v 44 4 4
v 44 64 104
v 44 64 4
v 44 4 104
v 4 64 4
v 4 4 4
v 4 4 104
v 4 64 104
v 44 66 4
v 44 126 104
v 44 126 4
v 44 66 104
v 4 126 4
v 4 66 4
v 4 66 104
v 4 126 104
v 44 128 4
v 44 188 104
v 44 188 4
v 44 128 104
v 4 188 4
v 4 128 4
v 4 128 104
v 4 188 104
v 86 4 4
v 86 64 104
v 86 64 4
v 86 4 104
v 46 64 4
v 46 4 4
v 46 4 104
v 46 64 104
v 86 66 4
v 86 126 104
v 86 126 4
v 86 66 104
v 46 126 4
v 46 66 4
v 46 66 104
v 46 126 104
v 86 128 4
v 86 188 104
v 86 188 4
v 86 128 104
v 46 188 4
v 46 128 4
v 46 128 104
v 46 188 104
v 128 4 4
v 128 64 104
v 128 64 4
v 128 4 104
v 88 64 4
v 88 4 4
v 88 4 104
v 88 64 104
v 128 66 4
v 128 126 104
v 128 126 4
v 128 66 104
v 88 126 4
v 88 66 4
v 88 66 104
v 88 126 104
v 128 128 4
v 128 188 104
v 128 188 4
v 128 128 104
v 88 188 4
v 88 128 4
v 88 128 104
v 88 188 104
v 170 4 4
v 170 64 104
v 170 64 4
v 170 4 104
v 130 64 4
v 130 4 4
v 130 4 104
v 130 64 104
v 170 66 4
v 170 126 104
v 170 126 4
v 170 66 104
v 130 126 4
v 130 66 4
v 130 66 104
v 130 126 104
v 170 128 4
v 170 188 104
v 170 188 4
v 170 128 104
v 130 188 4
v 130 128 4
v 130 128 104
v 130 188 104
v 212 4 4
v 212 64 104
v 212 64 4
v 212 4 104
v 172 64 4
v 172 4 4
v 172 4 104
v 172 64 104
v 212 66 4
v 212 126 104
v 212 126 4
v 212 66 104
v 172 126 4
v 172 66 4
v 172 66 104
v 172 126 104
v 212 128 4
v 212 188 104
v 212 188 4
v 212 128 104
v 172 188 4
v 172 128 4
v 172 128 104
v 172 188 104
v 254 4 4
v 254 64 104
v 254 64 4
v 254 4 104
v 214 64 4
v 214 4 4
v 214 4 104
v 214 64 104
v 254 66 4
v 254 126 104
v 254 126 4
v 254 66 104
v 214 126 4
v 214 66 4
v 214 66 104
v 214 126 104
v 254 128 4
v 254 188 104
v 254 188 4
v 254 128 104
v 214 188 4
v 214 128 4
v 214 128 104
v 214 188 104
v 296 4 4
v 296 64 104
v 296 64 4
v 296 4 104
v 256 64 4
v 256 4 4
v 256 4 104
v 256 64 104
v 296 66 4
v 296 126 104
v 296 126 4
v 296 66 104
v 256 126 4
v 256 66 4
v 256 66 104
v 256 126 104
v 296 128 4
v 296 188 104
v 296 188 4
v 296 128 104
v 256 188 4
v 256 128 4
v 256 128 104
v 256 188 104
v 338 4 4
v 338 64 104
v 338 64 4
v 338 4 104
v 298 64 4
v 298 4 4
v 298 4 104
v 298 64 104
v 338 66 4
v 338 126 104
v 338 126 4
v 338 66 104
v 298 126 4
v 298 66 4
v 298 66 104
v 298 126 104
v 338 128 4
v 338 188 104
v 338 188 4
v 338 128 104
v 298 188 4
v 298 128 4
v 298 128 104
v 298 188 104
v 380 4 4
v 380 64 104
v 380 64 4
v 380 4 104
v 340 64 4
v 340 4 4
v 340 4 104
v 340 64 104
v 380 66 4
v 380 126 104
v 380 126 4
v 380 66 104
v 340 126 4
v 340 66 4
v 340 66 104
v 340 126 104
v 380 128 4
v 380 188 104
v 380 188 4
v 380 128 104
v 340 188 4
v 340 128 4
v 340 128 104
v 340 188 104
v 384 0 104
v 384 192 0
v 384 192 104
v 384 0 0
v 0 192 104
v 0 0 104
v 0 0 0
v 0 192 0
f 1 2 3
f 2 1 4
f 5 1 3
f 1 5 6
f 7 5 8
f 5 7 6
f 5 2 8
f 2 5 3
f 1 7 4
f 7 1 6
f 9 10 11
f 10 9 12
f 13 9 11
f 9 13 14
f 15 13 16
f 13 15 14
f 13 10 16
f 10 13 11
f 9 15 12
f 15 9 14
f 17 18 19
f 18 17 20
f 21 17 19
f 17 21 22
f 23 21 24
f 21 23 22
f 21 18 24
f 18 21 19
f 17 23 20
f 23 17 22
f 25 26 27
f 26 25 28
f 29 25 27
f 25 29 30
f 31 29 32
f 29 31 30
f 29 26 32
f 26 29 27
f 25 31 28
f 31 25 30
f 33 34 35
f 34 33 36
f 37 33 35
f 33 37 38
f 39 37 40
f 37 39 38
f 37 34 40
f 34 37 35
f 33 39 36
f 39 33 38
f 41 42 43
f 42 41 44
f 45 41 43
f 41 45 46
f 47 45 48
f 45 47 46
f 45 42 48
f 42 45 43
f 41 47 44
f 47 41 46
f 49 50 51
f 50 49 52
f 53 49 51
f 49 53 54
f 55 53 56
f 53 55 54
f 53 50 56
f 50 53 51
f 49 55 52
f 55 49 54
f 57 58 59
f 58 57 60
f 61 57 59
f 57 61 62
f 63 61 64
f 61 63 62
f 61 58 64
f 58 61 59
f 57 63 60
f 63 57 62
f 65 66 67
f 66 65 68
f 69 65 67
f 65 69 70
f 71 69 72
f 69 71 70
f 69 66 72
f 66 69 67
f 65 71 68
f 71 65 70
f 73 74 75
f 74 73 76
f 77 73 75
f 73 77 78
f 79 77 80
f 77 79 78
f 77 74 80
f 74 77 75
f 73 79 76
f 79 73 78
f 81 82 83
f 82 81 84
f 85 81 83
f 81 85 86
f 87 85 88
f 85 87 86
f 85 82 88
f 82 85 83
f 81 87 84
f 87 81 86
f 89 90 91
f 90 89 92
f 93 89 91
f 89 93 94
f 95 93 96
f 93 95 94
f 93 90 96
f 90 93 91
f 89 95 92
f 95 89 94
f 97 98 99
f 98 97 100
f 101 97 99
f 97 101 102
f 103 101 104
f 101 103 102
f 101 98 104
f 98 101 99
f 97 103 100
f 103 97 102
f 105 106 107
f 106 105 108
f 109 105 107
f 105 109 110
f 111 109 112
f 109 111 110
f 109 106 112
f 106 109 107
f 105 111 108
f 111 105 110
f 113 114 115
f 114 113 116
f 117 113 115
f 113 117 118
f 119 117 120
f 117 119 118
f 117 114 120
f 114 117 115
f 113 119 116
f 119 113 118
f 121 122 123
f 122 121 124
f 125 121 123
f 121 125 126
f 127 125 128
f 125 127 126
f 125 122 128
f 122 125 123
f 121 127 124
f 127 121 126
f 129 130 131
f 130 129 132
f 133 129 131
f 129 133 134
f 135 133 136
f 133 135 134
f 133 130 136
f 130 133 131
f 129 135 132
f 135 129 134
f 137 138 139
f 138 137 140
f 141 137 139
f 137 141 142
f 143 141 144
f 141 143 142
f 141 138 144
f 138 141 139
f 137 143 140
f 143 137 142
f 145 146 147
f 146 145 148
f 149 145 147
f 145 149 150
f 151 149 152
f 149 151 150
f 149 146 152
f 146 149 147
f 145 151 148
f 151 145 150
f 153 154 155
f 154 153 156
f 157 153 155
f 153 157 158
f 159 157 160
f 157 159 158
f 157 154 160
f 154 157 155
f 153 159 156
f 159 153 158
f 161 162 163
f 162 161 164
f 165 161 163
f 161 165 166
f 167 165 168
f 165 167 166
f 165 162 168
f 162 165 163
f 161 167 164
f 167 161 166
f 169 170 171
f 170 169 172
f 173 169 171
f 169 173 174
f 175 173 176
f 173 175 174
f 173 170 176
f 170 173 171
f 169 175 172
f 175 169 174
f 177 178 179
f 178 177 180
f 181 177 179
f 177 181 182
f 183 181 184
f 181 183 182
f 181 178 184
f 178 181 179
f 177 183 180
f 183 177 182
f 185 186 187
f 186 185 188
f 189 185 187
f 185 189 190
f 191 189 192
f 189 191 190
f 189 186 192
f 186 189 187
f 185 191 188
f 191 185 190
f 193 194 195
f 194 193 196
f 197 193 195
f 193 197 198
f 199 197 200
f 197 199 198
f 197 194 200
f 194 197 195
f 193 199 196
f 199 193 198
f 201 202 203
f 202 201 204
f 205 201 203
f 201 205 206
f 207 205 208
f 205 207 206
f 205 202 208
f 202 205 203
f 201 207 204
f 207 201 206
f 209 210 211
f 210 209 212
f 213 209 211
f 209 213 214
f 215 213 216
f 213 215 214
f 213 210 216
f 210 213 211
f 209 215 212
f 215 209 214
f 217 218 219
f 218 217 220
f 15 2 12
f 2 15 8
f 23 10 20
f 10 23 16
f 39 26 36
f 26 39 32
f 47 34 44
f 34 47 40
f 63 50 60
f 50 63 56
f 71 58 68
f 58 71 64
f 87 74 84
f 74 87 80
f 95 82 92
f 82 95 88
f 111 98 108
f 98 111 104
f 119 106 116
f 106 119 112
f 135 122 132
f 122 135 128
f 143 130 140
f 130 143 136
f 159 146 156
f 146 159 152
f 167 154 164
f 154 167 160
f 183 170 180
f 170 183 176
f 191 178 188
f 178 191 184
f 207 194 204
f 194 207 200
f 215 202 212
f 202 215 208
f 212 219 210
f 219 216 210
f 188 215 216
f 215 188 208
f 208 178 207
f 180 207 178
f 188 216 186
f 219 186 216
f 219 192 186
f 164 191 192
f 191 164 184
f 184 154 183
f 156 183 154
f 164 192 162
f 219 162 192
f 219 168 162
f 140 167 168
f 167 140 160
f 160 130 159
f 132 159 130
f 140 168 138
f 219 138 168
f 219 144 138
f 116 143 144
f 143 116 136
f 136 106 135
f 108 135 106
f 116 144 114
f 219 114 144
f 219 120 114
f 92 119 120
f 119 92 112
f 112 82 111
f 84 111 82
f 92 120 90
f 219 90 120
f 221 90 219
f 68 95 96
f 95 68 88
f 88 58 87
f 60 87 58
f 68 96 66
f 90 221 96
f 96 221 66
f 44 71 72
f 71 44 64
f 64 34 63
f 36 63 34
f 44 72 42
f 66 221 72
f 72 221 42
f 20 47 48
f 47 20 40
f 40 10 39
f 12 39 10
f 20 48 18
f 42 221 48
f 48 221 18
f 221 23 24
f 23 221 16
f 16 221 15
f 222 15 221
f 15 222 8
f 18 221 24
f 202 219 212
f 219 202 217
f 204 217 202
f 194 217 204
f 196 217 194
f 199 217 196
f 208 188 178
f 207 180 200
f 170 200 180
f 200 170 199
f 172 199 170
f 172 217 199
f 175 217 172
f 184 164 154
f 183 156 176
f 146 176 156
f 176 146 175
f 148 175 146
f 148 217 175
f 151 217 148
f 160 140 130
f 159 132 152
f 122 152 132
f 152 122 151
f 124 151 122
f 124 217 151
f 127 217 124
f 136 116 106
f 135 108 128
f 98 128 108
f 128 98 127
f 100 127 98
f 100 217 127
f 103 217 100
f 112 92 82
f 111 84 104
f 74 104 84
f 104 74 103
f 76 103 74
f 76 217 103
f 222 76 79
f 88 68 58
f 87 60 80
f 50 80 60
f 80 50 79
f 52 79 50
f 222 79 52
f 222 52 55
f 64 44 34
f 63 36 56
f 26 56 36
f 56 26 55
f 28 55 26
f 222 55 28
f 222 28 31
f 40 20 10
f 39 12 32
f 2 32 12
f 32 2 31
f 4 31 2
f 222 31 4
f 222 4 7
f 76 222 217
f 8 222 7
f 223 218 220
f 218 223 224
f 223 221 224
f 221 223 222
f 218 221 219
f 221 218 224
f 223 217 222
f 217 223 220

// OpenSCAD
/* [Holes dimensions] */
// Internal length (X)
lg = 40;
// Internal width (Y)
wd = 60;
// Internal depth (Z)
dp = 100;

/* [Thickness] */
// External thickness
extTk = 4;
// Internal thickness
intTk = 2;

/* [Multipliers] */
// Number multiplier on axe X
multX = 9;
// Number multiplier on axe Y
multY = 3;

module box(lg, wd, dp, extTk, intTk, multX, multY)
{
    difference ()
    {
        // External length (X)
        sizeX = lg*multX + 2*extTk + (multX-1)*intTk; 
        // External width (Y)
        sizeY = wd*multY + 2*extTk + (multY-1)*intTk;
        // External heigth (Z)
        sizeZ = dp + extTk;
        
        // External box
        cube([sizeX, sizeY, sizeZ]);
        
        // Holes
        for (vX=[0:multX-1], vY=[0:multY-1])
            translate([extTk+vX*(lg+intTk), extTk+vY*(wd+intTk),extTk])
            cube([lg, wd, dp+0.1]);
    }
}

box(lg=lg, wd=wd, dp=dp, extTk=extTk, intTk=intTk, multX=multX, multY=multY);
